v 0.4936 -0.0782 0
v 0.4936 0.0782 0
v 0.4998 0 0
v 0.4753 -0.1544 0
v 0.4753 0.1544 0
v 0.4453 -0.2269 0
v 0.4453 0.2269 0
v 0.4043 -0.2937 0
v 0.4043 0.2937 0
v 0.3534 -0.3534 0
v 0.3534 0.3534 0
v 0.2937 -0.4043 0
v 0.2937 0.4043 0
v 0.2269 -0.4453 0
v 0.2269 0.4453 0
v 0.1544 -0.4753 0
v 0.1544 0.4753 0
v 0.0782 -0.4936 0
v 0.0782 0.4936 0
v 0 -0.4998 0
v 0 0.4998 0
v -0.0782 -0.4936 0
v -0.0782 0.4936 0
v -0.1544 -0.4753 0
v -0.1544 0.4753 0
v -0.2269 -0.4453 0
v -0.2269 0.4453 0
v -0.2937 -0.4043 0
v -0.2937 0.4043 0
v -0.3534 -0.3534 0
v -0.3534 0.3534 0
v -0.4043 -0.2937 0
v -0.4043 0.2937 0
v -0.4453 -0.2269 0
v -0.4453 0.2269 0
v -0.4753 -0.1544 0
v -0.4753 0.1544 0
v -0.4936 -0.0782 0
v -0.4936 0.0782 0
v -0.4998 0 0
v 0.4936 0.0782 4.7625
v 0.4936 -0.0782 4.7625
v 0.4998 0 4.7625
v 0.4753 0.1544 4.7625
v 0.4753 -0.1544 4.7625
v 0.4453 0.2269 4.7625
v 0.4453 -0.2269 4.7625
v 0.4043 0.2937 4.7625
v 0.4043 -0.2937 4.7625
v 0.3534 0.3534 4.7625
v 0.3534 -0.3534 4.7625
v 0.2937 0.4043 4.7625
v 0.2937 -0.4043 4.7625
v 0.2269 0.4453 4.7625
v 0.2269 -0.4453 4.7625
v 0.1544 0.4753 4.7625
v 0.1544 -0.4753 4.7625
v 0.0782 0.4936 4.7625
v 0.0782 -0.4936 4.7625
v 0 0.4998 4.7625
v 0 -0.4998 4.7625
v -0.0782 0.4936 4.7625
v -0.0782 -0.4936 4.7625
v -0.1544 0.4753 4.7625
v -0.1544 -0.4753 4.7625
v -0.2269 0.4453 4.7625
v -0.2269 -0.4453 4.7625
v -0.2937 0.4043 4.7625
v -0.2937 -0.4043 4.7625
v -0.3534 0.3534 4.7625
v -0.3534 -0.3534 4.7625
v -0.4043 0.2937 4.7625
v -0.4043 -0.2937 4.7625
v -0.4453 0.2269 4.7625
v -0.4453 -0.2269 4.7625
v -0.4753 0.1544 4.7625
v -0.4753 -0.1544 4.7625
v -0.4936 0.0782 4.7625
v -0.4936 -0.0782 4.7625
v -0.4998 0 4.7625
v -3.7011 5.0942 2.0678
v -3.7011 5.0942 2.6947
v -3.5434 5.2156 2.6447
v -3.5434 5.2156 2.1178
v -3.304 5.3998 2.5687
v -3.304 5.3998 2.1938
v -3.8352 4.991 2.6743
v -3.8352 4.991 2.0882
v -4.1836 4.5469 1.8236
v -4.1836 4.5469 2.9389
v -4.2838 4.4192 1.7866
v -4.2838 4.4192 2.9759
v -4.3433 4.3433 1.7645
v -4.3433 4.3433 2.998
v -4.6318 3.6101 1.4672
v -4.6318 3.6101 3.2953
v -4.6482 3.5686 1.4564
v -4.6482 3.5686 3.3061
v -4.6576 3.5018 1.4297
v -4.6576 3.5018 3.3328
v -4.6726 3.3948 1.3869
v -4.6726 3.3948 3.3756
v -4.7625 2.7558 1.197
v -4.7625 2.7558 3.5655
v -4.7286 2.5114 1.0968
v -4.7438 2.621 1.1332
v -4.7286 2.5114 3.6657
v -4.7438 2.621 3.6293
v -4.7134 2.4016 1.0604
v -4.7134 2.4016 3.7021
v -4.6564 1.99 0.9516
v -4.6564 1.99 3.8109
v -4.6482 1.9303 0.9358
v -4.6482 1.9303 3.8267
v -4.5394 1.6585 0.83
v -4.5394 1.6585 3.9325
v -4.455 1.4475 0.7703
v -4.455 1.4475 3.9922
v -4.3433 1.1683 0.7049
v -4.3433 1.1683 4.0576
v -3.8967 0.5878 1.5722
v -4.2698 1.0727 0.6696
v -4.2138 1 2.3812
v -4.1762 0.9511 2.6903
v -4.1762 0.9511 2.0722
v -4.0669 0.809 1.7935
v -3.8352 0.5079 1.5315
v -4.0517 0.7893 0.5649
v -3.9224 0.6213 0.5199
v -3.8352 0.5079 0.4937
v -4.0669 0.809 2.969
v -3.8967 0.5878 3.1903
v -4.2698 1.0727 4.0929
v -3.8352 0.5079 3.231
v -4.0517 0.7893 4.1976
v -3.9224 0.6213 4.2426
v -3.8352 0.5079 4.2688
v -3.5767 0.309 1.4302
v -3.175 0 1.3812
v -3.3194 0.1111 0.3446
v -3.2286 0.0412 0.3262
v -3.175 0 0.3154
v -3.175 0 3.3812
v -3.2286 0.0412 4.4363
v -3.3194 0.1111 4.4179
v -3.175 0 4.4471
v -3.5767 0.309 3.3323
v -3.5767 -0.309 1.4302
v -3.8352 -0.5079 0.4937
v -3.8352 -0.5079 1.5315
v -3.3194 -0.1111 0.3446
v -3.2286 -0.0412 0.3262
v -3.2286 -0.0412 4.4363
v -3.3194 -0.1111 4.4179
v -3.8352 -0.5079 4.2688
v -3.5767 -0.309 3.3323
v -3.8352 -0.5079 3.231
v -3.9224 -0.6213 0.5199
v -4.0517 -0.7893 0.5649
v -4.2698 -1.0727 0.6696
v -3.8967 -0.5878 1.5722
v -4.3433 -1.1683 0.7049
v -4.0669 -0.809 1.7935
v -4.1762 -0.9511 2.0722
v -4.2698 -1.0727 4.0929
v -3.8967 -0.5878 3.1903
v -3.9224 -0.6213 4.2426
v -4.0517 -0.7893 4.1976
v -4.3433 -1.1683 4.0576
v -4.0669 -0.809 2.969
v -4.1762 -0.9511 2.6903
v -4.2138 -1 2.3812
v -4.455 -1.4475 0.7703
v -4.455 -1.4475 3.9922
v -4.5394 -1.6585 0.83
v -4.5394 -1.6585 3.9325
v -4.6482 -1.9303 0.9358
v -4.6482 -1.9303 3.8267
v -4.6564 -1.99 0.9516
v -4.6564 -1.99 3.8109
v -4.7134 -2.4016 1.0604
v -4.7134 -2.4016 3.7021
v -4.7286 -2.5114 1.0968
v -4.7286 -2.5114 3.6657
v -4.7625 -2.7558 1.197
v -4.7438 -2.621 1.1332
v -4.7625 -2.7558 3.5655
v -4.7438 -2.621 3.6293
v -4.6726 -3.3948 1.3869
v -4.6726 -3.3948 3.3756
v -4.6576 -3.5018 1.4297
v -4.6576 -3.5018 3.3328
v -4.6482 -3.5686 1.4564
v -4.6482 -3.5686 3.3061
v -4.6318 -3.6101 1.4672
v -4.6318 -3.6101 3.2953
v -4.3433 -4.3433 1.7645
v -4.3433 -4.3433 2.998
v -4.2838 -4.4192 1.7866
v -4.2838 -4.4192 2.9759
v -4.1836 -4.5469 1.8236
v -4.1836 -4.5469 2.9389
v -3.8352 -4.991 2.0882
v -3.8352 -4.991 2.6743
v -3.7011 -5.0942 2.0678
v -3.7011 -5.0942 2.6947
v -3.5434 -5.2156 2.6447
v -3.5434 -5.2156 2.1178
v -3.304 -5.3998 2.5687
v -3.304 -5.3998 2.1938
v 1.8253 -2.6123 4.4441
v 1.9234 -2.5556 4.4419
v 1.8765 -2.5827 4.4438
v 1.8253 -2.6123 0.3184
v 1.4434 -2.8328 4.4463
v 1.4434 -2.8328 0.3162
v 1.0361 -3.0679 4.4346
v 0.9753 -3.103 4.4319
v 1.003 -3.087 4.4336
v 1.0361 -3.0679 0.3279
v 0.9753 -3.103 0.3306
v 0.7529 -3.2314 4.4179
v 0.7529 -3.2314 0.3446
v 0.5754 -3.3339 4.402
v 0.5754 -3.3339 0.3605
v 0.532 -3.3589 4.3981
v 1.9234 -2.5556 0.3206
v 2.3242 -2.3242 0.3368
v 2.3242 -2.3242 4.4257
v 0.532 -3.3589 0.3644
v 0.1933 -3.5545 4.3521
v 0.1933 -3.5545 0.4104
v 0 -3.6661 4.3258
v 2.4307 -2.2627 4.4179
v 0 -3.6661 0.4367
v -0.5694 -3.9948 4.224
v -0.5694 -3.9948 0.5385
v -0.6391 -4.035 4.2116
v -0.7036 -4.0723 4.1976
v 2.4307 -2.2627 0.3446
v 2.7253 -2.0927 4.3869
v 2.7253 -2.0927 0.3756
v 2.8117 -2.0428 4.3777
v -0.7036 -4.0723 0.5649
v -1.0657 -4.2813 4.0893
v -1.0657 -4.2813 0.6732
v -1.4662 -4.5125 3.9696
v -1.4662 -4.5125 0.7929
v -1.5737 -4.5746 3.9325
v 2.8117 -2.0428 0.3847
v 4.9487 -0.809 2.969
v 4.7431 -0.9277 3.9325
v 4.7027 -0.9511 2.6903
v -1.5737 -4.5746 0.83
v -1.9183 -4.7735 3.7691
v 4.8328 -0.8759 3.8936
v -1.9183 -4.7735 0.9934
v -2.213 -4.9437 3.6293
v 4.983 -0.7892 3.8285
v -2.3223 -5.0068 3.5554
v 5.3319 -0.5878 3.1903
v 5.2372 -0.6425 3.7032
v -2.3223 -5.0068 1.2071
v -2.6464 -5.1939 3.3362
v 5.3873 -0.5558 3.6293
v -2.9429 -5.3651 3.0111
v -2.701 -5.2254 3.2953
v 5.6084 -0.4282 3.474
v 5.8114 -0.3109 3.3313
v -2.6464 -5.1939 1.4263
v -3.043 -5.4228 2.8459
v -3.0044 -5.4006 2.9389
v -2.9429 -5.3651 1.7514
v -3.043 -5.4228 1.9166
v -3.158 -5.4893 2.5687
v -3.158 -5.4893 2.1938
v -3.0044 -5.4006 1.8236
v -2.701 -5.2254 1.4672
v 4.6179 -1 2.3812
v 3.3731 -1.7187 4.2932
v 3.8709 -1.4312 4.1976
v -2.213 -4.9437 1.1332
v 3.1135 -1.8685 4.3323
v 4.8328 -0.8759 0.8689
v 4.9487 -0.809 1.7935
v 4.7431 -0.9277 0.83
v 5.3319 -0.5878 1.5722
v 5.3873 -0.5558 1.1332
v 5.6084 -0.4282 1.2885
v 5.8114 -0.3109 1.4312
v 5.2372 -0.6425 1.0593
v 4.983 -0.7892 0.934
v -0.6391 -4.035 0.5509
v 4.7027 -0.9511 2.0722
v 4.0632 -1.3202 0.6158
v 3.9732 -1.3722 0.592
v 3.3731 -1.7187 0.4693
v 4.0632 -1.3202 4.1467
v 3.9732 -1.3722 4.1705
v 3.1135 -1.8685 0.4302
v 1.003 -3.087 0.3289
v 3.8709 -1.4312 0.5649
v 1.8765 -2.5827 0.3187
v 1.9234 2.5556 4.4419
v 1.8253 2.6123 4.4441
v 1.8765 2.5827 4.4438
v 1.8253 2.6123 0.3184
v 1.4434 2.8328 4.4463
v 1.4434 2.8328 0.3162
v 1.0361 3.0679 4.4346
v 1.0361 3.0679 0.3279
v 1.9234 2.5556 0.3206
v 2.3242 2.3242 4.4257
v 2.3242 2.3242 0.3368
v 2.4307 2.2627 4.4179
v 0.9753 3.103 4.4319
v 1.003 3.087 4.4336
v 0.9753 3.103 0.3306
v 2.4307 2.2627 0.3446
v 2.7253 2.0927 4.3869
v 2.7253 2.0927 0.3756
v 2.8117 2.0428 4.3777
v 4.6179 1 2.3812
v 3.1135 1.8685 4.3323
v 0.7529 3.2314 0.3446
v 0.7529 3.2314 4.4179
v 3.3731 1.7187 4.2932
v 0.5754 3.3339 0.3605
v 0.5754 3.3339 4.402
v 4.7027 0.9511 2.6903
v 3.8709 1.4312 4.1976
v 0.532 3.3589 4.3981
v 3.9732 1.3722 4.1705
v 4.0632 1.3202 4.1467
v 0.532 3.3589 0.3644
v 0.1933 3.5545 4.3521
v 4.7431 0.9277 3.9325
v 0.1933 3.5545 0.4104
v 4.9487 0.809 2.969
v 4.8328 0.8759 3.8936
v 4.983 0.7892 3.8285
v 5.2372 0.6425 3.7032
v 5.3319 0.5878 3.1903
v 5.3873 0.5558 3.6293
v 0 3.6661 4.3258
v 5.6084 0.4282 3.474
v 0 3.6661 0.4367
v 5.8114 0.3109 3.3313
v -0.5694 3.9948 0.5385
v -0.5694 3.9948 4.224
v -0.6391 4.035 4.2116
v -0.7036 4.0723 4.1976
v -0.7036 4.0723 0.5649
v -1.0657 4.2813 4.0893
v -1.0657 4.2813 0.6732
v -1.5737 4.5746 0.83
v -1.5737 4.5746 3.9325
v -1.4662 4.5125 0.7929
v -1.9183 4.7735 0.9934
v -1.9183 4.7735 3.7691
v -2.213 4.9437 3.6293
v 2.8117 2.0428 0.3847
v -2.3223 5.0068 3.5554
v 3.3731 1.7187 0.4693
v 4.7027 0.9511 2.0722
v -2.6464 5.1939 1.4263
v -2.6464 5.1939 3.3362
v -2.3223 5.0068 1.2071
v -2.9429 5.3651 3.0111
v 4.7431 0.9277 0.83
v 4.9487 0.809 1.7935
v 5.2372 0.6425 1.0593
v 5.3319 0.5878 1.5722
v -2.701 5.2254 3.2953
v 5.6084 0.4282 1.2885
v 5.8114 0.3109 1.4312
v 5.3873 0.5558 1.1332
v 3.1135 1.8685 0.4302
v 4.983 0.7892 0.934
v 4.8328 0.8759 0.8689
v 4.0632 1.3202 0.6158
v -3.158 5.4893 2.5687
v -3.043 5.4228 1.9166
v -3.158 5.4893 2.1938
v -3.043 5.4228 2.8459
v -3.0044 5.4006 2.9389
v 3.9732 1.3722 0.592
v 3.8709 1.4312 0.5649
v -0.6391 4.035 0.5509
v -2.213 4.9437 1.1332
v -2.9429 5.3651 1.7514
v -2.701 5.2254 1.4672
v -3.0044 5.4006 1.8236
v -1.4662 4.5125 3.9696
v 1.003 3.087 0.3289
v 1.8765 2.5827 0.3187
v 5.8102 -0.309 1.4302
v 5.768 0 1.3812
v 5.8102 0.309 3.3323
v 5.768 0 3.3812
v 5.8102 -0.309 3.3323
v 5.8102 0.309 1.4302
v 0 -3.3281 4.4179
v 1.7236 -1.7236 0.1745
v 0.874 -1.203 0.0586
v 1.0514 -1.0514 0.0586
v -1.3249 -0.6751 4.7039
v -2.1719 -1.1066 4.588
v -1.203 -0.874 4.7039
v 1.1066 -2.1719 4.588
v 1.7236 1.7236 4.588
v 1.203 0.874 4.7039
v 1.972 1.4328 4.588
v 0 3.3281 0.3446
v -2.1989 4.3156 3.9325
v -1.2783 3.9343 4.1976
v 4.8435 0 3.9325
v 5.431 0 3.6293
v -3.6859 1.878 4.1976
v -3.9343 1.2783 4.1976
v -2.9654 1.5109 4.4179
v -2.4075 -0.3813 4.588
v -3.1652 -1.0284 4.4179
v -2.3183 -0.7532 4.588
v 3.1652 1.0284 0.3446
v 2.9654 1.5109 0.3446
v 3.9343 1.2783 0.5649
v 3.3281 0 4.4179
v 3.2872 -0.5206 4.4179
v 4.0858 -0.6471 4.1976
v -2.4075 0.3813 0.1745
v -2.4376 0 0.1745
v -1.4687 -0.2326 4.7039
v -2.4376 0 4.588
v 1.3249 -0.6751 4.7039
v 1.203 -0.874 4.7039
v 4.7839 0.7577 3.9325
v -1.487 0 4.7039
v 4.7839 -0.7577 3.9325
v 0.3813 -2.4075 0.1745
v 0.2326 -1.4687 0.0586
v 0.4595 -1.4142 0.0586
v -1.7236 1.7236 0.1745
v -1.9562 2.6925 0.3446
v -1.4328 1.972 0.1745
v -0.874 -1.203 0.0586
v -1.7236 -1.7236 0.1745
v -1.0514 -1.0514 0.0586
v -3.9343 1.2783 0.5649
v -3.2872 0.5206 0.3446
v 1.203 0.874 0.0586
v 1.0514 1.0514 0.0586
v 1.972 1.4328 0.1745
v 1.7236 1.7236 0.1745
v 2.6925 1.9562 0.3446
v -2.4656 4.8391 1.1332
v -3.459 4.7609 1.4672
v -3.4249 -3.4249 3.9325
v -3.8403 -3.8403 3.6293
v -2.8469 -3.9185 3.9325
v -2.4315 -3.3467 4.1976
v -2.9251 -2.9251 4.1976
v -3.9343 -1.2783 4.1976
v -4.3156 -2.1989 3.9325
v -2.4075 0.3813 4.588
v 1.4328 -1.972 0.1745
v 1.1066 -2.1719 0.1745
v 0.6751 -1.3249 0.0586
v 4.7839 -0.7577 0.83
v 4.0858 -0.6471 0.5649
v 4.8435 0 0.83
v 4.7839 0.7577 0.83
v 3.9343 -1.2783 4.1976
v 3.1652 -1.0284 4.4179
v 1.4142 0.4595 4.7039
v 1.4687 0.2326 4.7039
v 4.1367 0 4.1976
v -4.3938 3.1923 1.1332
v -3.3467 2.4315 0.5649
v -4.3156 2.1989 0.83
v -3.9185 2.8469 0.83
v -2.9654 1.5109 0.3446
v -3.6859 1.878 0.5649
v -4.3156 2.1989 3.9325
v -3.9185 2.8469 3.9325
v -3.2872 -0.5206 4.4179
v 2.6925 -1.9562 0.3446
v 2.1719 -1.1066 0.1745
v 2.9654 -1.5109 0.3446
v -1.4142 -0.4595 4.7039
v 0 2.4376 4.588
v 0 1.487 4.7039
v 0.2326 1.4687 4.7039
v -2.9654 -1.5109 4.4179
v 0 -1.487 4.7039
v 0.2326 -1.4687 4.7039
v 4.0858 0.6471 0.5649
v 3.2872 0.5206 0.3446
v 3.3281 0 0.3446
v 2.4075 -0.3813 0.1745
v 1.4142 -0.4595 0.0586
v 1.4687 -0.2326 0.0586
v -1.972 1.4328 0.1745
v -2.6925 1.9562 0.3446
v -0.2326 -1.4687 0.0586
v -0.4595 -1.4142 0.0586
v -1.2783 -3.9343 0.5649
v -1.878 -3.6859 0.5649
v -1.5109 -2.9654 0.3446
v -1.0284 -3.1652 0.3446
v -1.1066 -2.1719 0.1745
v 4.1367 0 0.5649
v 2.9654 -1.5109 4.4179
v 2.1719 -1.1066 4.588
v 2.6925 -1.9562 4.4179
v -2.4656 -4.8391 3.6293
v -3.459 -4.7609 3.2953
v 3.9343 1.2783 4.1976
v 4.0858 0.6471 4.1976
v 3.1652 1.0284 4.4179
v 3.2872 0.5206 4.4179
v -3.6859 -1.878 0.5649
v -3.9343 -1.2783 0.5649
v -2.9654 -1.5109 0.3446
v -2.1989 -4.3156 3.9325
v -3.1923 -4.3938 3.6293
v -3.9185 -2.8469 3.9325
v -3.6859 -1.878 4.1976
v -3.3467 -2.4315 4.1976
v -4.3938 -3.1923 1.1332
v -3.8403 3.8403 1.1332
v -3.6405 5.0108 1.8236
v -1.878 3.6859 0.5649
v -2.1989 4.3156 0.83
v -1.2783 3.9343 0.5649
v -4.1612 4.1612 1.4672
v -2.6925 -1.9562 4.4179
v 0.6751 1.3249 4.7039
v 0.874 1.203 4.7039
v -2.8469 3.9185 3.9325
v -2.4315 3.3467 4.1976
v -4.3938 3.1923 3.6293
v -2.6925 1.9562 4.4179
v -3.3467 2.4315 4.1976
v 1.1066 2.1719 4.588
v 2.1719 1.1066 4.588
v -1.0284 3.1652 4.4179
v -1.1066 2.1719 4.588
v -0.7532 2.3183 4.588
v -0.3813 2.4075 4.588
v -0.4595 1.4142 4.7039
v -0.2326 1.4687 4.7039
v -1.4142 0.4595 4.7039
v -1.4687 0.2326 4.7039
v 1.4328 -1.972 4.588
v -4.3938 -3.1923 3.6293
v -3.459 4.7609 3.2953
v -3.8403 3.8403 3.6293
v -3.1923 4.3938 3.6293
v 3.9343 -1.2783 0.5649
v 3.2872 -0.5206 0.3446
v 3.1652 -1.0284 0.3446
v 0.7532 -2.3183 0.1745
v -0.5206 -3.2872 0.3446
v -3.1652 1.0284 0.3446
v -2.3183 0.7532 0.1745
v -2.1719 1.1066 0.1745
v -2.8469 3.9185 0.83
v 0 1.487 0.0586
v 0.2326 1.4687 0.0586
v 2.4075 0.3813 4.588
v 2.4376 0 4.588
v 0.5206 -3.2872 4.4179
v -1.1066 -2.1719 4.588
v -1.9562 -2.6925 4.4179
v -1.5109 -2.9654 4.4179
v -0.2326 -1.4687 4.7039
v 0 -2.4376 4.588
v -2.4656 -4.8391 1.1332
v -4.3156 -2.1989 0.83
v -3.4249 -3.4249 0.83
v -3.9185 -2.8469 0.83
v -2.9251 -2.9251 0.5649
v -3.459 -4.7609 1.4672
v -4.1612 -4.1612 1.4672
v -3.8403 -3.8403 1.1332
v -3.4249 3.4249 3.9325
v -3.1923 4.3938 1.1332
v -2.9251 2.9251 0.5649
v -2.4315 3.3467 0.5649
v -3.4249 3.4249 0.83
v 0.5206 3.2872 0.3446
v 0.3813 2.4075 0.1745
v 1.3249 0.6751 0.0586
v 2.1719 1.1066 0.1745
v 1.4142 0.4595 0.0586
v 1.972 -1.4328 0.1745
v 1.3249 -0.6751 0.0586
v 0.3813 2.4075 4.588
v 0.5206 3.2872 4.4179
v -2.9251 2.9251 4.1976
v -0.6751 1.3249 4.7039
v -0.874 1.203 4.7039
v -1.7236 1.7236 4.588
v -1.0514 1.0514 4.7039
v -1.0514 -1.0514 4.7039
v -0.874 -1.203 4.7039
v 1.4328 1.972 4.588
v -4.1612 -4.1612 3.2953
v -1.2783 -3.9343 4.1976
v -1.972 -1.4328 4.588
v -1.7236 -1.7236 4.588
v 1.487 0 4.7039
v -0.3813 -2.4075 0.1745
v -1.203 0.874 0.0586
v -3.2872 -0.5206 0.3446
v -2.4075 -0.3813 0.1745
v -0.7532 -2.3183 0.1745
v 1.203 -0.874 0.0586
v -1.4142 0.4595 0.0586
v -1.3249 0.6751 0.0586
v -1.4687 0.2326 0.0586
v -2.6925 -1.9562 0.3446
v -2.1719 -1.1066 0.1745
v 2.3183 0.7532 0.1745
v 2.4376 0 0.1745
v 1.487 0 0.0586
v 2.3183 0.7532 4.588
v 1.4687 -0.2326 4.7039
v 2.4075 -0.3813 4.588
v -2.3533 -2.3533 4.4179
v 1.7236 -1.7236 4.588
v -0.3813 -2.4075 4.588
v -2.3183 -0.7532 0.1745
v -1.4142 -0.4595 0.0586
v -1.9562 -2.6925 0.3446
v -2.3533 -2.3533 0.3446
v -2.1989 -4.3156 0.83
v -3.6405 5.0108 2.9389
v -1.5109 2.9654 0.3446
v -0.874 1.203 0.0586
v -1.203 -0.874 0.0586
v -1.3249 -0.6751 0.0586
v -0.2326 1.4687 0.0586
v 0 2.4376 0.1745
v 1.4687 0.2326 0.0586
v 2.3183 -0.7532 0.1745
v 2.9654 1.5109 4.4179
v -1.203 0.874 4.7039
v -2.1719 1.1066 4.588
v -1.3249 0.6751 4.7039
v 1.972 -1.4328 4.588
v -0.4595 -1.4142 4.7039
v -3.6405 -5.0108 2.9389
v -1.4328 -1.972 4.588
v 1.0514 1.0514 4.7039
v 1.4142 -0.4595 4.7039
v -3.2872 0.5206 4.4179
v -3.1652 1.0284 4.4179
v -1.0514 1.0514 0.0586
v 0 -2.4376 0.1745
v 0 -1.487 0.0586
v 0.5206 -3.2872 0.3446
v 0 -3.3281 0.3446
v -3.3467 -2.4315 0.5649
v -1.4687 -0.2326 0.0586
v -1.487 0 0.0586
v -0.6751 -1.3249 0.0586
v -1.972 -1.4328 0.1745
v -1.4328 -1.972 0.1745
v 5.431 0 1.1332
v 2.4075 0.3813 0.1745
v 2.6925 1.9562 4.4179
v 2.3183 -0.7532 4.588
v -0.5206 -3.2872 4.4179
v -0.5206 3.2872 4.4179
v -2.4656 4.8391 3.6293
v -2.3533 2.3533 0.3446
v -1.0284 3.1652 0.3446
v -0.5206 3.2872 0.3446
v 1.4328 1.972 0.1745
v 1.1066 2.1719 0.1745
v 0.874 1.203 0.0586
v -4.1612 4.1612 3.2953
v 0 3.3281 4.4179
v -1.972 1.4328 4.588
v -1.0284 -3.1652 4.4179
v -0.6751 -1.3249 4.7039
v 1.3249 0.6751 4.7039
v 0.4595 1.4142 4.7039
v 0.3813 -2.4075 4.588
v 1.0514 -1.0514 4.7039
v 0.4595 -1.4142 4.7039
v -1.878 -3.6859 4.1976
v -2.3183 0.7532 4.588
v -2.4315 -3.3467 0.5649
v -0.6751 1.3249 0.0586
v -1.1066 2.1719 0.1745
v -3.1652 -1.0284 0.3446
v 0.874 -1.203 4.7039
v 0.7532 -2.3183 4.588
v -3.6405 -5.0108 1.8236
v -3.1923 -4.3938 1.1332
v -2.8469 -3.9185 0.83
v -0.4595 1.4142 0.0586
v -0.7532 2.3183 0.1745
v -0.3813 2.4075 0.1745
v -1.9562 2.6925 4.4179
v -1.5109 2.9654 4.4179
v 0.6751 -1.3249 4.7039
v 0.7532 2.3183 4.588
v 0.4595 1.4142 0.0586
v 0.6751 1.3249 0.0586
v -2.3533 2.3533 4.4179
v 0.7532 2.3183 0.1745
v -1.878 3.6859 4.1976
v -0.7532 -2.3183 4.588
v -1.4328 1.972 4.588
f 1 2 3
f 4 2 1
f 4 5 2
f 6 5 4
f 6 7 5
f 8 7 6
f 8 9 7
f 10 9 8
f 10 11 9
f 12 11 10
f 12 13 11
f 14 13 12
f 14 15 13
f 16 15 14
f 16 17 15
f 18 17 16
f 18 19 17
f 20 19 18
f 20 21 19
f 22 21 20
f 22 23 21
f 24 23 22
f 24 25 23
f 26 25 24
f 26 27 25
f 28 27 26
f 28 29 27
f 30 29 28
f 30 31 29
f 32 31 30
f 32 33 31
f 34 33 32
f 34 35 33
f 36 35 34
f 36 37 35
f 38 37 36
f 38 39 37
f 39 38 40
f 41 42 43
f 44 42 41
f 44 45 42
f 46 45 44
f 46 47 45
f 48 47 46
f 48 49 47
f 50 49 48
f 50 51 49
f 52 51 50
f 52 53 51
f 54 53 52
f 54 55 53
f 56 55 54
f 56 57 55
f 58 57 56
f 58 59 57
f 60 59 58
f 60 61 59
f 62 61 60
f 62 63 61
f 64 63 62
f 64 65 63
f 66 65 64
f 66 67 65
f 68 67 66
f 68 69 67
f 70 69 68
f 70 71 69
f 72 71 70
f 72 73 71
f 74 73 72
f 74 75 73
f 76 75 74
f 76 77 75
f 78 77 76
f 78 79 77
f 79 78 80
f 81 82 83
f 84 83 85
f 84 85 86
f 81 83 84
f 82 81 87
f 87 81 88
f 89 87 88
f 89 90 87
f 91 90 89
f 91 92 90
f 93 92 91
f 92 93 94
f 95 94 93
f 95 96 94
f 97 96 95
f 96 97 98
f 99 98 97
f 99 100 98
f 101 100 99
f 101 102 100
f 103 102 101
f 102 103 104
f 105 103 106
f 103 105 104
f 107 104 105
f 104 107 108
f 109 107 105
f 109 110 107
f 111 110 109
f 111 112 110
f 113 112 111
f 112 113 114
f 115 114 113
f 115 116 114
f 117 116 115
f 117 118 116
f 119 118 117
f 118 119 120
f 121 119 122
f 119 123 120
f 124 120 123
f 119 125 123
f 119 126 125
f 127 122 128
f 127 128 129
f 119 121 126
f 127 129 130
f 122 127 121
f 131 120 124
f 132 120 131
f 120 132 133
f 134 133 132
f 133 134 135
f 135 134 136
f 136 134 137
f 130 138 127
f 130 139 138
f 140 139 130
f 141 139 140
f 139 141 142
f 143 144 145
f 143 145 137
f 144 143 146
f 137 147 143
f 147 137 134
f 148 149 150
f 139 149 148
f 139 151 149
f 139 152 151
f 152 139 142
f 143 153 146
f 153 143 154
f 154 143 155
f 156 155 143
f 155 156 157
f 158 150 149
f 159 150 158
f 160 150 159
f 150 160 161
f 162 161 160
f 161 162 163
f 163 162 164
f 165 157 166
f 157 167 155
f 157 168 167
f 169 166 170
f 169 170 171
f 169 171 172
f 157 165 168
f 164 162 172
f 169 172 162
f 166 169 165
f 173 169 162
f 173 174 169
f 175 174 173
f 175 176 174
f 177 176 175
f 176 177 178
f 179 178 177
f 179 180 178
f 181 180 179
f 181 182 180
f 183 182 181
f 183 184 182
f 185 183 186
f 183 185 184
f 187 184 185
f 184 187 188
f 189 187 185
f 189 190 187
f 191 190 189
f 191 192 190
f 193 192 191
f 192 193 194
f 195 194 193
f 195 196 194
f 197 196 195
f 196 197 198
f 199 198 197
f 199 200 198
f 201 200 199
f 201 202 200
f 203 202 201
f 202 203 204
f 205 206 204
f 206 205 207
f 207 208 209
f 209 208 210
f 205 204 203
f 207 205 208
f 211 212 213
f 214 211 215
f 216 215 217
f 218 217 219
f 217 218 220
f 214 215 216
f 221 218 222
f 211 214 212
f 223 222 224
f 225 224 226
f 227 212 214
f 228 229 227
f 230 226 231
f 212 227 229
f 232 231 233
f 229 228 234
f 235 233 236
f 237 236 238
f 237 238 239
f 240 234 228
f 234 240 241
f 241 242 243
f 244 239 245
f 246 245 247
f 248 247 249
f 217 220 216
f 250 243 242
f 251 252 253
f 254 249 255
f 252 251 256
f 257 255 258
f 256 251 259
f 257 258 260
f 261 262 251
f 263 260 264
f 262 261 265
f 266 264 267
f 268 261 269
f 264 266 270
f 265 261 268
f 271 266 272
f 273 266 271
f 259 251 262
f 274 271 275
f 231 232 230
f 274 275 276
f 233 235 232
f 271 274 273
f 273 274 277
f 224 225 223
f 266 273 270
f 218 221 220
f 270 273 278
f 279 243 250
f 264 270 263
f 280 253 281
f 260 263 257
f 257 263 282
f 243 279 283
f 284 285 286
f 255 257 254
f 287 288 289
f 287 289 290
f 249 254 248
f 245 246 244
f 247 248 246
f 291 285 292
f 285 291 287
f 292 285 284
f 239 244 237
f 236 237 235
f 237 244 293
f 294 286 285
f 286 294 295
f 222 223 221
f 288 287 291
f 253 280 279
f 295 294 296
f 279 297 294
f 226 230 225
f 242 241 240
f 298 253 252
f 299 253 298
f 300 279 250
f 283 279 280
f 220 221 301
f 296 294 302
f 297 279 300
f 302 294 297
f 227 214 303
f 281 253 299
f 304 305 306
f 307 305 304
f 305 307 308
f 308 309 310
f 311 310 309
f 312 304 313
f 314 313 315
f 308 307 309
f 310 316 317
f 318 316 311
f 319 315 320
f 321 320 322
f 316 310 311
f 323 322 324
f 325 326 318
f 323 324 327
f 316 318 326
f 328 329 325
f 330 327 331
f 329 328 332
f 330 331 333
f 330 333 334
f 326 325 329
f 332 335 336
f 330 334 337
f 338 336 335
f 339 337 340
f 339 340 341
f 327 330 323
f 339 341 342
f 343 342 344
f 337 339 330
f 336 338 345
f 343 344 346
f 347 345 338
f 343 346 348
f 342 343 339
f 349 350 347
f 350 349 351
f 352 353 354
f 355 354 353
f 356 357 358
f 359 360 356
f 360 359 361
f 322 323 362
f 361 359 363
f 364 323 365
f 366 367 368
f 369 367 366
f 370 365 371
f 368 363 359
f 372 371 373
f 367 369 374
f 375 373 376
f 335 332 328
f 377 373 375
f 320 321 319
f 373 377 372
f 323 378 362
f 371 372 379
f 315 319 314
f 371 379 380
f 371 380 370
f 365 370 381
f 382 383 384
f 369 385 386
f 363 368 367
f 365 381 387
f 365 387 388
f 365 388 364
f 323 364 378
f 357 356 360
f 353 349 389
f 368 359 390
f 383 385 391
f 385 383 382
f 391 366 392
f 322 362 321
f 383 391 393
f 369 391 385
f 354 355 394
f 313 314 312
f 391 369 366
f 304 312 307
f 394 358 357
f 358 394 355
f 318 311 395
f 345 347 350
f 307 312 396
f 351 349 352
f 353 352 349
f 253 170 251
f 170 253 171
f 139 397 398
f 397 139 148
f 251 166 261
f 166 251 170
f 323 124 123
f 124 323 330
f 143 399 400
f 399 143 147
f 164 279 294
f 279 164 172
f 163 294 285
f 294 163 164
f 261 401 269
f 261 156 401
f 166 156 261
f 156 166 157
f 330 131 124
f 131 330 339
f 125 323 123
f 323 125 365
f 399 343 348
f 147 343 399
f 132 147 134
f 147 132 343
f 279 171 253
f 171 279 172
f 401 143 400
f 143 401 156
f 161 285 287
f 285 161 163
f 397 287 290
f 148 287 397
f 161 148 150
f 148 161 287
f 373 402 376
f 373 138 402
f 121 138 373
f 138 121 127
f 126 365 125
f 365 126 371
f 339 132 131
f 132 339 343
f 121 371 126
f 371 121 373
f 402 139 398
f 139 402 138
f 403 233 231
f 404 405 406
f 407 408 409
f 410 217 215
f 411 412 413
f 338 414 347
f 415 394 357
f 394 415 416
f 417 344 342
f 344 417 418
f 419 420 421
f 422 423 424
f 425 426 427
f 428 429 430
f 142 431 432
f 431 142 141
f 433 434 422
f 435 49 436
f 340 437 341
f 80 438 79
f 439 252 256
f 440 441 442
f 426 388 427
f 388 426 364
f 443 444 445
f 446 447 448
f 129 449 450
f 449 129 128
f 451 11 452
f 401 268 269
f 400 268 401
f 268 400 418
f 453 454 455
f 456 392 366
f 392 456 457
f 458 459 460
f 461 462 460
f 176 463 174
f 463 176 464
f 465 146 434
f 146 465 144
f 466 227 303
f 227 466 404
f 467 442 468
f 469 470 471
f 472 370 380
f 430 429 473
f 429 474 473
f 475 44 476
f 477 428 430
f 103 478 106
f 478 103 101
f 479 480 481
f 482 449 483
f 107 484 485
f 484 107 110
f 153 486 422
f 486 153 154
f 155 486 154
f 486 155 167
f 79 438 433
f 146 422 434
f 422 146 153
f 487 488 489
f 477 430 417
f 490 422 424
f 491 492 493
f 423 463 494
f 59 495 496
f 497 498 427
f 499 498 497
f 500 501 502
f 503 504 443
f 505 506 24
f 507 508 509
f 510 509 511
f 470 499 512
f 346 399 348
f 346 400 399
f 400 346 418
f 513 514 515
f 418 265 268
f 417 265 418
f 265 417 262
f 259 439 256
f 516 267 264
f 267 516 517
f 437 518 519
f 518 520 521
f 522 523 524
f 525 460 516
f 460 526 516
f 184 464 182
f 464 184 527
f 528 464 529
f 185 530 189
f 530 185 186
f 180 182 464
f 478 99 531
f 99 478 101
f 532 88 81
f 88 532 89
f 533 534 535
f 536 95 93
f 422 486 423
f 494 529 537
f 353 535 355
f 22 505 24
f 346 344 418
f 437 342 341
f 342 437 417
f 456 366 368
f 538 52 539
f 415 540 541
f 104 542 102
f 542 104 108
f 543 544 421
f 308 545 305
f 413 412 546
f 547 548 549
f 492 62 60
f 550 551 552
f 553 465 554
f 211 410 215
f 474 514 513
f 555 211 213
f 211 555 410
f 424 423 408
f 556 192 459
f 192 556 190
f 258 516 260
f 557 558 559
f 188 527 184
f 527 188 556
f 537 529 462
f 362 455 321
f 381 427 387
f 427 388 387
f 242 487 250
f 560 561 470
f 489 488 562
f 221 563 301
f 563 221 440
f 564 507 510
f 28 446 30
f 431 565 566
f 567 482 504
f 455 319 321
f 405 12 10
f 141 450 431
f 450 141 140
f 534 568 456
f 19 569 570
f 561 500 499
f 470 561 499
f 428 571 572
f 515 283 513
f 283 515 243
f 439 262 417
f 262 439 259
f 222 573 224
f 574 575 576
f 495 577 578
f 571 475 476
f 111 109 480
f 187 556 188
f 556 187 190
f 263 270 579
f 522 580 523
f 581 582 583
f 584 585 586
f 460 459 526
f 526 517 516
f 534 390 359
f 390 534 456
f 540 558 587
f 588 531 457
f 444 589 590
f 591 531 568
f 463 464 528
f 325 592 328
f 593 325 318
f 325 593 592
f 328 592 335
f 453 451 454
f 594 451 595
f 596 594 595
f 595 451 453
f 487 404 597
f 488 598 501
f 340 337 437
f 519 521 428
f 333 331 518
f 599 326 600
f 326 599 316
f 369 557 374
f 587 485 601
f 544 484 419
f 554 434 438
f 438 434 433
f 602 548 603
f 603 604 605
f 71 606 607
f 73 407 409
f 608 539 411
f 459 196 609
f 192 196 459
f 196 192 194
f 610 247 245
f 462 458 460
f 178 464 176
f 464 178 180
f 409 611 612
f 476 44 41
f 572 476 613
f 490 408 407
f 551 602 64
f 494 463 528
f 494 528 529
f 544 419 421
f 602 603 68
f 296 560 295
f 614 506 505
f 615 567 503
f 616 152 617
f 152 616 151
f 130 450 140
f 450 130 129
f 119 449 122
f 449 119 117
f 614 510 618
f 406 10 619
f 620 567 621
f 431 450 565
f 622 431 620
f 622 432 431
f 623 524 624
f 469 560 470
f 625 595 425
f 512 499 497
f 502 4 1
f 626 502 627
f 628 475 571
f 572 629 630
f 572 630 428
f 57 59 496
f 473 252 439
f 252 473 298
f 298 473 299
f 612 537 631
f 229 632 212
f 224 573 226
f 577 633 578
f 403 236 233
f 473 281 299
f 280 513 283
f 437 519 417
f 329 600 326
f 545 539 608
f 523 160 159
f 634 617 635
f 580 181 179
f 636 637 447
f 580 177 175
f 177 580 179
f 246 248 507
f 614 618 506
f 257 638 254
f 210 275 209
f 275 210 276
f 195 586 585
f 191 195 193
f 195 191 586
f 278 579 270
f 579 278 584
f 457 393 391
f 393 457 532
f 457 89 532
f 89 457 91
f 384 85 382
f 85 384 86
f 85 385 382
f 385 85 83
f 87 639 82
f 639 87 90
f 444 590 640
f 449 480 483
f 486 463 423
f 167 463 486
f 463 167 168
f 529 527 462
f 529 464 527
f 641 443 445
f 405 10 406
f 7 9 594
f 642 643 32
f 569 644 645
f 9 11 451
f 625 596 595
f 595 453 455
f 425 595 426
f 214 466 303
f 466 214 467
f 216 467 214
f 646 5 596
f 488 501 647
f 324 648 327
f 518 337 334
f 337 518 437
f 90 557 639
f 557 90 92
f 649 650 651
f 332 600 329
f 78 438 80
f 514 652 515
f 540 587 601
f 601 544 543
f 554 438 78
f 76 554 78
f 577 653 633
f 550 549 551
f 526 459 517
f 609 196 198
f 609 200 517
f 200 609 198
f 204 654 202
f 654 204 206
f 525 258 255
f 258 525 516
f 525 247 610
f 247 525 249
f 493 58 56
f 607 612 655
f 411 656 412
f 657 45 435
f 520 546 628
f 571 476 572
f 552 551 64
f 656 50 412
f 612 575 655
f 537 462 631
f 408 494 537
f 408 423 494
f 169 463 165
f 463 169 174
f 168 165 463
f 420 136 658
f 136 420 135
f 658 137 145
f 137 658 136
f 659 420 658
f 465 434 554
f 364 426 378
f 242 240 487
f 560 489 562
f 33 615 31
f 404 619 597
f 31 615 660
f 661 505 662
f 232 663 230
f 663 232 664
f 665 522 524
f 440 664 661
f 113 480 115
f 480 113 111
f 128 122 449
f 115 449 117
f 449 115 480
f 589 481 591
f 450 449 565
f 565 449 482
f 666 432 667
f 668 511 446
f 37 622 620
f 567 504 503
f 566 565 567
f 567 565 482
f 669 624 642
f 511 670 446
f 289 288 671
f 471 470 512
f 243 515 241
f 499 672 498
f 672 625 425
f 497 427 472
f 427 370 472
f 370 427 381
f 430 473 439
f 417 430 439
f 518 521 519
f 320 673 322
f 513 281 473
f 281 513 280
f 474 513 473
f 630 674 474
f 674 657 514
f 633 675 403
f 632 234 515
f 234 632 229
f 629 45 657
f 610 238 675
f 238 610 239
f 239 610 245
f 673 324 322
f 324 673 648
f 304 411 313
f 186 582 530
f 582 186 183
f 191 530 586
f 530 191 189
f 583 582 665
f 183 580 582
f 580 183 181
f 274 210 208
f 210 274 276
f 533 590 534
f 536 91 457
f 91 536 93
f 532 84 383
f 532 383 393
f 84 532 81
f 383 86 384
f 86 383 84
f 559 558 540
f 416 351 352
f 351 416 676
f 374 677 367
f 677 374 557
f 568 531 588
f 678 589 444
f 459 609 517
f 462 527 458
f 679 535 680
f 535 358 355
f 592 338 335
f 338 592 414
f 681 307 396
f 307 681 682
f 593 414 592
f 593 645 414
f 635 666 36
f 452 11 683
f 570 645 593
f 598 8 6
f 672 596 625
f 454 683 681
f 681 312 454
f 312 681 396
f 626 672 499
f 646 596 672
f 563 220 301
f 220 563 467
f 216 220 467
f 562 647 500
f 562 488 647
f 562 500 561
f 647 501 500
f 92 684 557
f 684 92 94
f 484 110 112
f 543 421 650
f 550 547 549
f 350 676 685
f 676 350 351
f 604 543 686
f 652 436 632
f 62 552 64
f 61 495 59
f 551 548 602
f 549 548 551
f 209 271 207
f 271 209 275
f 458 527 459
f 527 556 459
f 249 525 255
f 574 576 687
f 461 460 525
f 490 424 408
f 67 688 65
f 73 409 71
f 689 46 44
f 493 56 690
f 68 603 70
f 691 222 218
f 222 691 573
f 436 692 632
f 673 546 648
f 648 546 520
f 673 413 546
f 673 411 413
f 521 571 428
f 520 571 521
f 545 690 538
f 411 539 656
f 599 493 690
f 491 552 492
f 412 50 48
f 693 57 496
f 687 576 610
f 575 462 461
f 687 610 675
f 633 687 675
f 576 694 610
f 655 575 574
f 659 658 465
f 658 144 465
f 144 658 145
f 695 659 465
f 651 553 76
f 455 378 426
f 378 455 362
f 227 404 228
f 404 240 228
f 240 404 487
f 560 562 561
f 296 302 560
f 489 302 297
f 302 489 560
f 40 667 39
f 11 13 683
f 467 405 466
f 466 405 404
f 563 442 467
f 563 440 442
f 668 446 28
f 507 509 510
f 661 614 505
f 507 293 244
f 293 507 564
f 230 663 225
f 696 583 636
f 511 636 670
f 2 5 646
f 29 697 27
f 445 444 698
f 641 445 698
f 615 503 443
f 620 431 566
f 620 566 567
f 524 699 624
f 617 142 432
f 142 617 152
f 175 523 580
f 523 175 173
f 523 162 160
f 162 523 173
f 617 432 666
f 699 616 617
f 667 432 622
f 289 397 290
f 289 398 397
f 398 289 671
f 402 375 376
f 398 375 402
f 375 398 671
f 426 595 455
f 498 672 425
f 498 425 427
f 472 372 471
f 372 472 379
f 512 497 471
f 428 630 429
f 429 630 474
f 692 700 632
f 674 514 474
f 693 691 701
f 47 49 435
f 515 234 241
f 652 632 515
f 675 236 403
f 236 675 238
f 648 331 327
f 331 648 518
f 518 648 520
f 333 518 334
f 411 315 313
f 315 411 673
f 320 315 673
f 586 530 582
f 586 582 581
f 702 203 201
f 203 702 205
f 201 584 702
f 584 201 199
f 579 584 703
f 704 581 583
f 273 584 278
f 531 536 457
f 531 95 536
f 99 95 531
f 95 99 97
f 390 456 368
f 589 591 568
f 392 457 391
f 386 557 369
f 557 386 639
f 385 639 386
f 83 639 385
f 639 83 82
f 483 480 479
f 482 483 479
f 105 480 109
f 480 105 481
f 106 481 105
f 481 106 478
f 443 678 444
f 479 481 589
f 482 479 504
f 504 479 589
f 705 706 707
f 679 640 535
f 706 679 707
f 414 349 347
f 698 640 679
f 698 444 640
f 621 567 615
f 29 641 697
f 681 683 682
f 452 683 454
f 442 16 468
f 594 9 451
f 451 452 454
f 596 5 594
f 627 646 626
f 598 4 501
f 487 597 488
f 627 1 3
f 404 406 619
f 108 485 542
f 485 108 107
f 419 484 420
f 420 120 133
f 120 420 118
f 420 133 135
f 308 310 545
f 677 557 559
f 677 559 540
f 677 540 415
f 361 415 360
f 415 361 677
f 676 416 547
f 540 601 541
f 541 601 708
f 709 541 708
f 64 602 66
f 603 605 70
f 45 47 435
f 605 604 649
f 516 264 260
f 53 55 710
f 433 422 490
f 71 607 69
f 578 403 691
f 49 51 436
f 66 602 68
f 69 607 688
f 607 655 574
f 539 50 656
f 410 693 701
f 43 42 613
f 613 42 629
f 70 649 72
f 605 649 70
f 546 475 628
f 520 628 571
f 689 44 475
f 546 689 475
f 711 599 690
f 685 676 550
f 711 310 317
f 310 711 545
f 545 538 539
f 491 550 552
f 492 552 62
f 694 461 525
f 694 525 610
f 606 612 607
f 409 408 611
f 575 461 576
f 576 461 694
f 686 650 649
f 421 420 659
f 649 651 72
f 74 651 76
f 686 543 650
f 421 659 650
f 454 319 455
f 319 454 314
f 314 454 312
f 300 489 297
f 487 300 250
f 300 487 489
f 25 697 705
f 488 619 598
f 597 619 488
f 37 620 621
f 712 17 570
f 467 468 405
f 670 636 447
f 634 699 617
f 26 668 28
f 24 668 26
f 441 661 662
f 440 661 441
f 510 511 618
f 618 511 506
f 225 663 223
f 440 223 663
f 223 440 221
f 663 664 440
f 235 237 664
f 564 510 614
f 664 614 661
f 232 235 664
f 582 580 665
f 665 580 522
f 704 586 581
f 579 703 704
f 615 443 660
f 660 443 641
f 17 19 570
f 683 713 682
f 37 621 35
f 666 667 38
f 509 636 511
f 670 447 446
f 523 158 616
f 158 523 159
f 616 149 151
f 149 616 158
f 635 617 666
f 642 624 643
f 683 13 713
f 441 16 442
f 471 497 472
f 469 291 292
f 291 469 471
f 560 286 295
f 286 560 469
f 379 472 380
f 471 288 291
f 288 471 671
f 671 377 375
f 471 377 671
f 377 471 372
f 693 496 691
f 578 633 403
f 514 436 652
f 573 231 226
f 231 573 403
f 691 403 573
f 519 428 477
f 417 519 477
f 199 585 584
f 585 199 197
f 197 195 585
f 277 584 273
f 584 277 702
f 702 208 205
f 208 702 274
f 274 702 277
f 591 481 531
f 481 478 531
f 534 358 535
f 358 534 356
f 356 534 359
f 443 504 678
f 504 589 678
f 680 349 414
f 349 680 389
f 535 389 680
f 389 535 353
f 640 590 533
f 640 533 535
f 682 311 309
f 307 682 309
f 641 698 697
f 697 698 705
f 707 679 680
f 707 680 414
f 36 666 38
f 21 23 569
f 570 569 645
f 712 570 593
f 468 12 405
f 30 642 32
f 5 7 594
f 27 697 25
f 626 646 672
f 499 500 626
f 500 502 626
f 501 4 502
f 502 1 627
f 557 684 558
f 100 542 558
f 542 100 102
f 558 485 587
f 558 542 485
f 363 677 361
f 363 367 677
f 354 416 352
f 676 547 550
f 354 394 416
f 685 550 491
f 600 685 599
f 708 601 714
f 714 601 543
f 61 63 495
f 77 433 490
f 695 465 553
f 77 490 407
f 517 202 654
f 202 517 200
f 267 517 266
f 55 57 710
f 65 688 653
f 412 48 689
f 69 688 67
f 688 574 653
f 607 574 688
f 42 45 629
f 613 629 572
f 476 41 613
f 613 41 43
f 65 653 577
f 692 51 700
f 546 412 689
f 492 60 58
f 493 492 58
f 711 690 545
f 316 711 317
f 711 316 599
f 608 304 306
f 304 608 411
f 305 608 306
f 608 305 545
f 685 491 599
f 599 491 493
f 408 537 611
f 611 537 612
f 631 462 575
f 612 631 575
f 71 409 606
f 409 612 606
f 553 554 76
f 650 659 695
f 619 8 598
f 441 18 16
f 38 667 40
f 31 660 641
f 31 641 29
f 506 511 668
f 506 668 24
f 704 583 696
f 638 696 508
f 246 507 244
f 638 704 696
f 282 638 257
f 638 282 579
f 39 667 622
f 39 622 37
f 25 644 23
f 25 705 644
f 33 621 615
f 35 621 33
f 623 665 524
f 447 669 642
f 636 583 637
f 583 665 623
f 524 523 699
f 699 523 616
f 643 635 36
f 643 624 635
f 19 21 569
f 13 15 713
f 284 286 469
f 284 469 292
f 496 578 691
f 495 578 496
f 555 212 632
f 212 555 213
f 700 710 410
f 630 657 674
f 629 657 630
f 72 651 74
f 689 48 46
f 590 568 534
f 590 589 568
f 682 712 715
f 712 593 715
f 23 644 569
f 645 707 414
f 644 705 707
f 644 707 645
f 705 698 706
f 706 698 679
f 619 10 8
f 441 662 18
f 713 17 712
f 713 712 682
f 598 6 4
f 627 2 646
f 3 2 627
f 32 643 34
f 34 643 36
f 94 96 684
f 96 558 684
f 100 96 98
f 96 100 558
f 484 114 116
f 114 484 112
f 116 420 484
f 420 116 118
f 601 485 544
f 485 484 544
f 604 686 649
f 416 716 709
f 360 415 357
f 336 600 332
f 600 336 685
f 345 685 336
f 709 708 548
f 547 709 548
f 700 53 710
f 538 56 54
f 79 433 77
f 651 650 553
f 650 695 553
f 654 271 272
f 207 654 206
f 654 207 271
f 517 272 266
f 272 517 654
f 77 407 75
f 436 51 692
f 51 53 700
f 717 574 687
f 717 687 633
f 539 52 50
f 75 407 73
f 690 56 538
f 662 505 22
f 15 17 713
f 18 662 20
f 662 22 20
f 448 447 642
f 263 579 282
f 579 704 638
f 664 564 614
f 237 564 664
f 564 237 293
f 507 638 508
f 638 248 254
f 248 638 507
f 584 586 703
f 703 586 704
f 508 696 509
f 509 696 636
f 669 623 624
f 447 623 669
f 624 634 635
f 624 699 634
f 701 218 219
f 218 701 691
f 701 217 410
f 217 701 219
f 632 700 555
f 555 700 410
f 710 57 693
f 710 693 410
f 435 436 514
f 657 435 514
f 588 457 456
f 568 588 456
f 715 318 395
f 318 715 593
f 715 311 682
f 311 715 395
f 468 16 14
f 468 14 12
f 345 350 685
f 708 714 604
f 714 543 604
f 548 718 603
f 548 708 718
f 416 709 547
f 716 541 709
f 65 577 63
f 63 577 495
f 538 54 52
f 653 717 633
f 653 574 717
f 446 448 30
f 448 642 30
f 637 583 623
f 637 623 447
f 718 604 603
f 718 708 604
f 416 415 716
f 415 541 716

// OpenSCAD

/* [Size of bead] */
//other shapes will be inscribed in a circle with that diameter
diameter_of_bead = .5;
height_of_bead = .1875;
/*[the hole in the bead]*/
diameter_of_hole = .0625;
axis_hole_is_on = 2;//[1:"z",2:"x",3:"y",4:"no hole"]
/*[advanced features]*/
//only mess with if you dare ^_^
ignore_error_messages = 2;//[1:true,0:false]

bead_shape = 9; //[0: circle, 1: 5 point star, 2: 6 point star, 3: triangle, 4: square, 5: pentagon, 6: hexagon, 8: octogon, 9: heart, 10: android, 11: (also not ready yet) apple]
resoultion = 40;//[5:100]
rounded_center =1;//[1:true,0:false]
//won't be implemented (yet...)
number_of_Colors = 1;


/* [Unit adjustment] */
//Basically are you using american units or real units
units_entered = 25.4;//[1:mm, 10:cm, 1000:meter, 25.4:inch, 304.8:foot]

//default is mm for most printers
desired_units_for_output = 1;//[1:mm, .1:cm, 0.001:meter, 0.0393701:inch, 0.00328084:foot]
//CUSTOMIZER VARIABLES END

unit_conversion_factor = units_entered*desired_units_for_output;

module base_shape (type_of_shape = 0){
	linear_extrude(height_of_bead*unit_conversion_factor){
		if(type_of_shape == 0){
			//circle
			circle(diameter_of_bead*unit_conversion_factor/2,$fn=resoultion);
		}
		else if(type_of_shape ==1){
			//5 point star
			rotate([0,0,-90]){
				polygon([[0,.5],[.476,.155],[.294,-.405],[-.294,-.405],[-.476,.155]]*diameter_of_bead*unit_conversion_factor,[[0,2,4,1,3]]);
				polygon([[.113,.156],[.182,-.059],[0,-.192],[-.182,-.059],[-.113,.156]]*diameter_of_bead*unit_conversion_factor,[[0,1,2,3,4]]);
			}
		}
		else if(type_of_shape ==2){
			//6 point star
			circle(diameter_of_bead*unit_conversion_factor/2,$fn=3);
			rotate([0,0,180]){
				circle(diameter_of_bead*unit_conversion_factor/2,$fn=3);
			}
		}
		else if(type_of_shape ==3){
			//triangle
			circle(diameter_of_bead*unit_conversion_factor/2,$fn=3);
		}
		else if(type_of_shape ==4){
			//square
			circle(diameter_of_bead*unit_conversion_factor/2,$fn=4);
		}
		else if(type_of_shape ==5){
			//pentagon
			circle(diameter_of_bead*unit_conversion_factor/2,$fn=5);
		}
		else if(type_of_shape ==6){
			//hexagon
			circle(diameter_of_bead*unit_conversion_factor/2,$fn=6);
		}
		else if(type_of_shape ==8){
			//octogon
				circle(diameter_of_bead*unit_conversion_factor/2,$fn=8);
		}
		/*else if(true){
			text("invalid shape of bead");
		}*/
		else if(type_of_shape == 9){
			rotate([0,0,90]){
				scale([diameter_of_bead*unit_conversion_factor,diameter_of_bead*unit_conversion_factor,0]){
					polygon([[.433,.25],[0,-.5],[-.433,.25],[-.393,.302],[-.342,.342],[-.281,.366],[-.217,.375],[-.152,.366],[-.092,.342],[-.04,.302],[0,.25],[.04,.302],[.092,.342],[.152,.366],[.217,.375],[.281,.366],[.342,.342],[.393,.302]]);
				}
			}
		}
		else if(type_of_shape ==10){
			//android
			scale([diameter_of_bead*unit_conversion_factor,diameter_of_bead*unit_conversion_factor,0]){
				translate([.25,0,0]){
					//head
					circle(.25,$fn = resoultion);
				}
				//body
				square(.5,center=true);
				translate([0,.25+.0312,0]){
					//left arm
					polygon(points=[[-.125,-.03125],[-.125,.03125],[.125,.03125],[.125,-.03125]]);
					translate([.125,0,0]){
						circle(.03125,$fn = resoultion);
					}
					translate([-.125,0,0]){
						circle(.03125,$fn = resoultion);
					}
				}
				translate([0,-.25-.0312,0]){
					//right arm
					polygon(points=[[-.125,-.03125],[-.125,.03125],[.125,.03125],[.125,-.03125]]);
					translate([.125,0,0]){
						circle(.03125,$fn = resoultion);
					}
					translate([-.125,0,0]){
						circle(.03125,$fn = resoultion);
					}
				}
				translate([-.25,.125,0]){
					//left leg
					polygon(points=[[-.125,-.0625],[-.125,.0625],[.125,.0625],[.125,-.0625]]);
					translate([-.125,0,0]){
						circle(.0625,$fn = resoultion);
					}
				}
				translate([-.25,-.125,0]){
					//right leg
					polygon(points=[[-.125,-.0625],[-.125,.0625],[.125,.0625],[.125,-.0625]]);
					translate([-.125,0,0]){
						circle(.0625,$fn = resoultion);
					}
				}
			}
			
		}
		else if(type_of_shape ==11){
			
		}


	}
}
module holes_to_be_cut(){	
	translate([0,0,-.1*unit_conversion_factor]){
		linear_extrude((height_of_bead+diameter_of_bead+1)*unit_conversion_factor,center=true)
				circle([diameter_of_hole*unit_conversion_factor,diameter_of_hole*unit_conversion_factor],$fn=resoultion/2);
	}
}
	
module round_bead(){
	translate([0,0,height_of_bead*unit_conversion_factor/2]){
		resize(newsize=[diameter_of_bead*unit_conversion_factor,diameter_of_bead*unit_conversion_factor,height_of_bead*unit_conversion_factor],center=true){
				sphere(diameter_of_bead*unit_conversion_factor,$fn=resoultion);
		}
	}
}
//user error message, aka warning you broke it

intersection(){
	difference(){
		base_shape(type_of_shape =bead_shape);
		if(axis_hole_is_on == 1){
			rotate([0,0,0]){
				holes_to_be_cut();
			}
		}
		else if(axis_hole_is_on == 2){
			translate([0,0,height_of_bead*unit_conversion_factor/2]){
				rotate([0,90,0]){
					holes_to_be_cut();
				}
			}
		}
		else if(axis_hole_is_on==3){
			translate([0,0,height_of_bead*unit_conversion_factor/2]){
				rotate([90,0,0]){
					holes_to_be_cut();
				}
			}
		}
	}
	
	if(rounded_center==1){
		round_bead();
	}
}
